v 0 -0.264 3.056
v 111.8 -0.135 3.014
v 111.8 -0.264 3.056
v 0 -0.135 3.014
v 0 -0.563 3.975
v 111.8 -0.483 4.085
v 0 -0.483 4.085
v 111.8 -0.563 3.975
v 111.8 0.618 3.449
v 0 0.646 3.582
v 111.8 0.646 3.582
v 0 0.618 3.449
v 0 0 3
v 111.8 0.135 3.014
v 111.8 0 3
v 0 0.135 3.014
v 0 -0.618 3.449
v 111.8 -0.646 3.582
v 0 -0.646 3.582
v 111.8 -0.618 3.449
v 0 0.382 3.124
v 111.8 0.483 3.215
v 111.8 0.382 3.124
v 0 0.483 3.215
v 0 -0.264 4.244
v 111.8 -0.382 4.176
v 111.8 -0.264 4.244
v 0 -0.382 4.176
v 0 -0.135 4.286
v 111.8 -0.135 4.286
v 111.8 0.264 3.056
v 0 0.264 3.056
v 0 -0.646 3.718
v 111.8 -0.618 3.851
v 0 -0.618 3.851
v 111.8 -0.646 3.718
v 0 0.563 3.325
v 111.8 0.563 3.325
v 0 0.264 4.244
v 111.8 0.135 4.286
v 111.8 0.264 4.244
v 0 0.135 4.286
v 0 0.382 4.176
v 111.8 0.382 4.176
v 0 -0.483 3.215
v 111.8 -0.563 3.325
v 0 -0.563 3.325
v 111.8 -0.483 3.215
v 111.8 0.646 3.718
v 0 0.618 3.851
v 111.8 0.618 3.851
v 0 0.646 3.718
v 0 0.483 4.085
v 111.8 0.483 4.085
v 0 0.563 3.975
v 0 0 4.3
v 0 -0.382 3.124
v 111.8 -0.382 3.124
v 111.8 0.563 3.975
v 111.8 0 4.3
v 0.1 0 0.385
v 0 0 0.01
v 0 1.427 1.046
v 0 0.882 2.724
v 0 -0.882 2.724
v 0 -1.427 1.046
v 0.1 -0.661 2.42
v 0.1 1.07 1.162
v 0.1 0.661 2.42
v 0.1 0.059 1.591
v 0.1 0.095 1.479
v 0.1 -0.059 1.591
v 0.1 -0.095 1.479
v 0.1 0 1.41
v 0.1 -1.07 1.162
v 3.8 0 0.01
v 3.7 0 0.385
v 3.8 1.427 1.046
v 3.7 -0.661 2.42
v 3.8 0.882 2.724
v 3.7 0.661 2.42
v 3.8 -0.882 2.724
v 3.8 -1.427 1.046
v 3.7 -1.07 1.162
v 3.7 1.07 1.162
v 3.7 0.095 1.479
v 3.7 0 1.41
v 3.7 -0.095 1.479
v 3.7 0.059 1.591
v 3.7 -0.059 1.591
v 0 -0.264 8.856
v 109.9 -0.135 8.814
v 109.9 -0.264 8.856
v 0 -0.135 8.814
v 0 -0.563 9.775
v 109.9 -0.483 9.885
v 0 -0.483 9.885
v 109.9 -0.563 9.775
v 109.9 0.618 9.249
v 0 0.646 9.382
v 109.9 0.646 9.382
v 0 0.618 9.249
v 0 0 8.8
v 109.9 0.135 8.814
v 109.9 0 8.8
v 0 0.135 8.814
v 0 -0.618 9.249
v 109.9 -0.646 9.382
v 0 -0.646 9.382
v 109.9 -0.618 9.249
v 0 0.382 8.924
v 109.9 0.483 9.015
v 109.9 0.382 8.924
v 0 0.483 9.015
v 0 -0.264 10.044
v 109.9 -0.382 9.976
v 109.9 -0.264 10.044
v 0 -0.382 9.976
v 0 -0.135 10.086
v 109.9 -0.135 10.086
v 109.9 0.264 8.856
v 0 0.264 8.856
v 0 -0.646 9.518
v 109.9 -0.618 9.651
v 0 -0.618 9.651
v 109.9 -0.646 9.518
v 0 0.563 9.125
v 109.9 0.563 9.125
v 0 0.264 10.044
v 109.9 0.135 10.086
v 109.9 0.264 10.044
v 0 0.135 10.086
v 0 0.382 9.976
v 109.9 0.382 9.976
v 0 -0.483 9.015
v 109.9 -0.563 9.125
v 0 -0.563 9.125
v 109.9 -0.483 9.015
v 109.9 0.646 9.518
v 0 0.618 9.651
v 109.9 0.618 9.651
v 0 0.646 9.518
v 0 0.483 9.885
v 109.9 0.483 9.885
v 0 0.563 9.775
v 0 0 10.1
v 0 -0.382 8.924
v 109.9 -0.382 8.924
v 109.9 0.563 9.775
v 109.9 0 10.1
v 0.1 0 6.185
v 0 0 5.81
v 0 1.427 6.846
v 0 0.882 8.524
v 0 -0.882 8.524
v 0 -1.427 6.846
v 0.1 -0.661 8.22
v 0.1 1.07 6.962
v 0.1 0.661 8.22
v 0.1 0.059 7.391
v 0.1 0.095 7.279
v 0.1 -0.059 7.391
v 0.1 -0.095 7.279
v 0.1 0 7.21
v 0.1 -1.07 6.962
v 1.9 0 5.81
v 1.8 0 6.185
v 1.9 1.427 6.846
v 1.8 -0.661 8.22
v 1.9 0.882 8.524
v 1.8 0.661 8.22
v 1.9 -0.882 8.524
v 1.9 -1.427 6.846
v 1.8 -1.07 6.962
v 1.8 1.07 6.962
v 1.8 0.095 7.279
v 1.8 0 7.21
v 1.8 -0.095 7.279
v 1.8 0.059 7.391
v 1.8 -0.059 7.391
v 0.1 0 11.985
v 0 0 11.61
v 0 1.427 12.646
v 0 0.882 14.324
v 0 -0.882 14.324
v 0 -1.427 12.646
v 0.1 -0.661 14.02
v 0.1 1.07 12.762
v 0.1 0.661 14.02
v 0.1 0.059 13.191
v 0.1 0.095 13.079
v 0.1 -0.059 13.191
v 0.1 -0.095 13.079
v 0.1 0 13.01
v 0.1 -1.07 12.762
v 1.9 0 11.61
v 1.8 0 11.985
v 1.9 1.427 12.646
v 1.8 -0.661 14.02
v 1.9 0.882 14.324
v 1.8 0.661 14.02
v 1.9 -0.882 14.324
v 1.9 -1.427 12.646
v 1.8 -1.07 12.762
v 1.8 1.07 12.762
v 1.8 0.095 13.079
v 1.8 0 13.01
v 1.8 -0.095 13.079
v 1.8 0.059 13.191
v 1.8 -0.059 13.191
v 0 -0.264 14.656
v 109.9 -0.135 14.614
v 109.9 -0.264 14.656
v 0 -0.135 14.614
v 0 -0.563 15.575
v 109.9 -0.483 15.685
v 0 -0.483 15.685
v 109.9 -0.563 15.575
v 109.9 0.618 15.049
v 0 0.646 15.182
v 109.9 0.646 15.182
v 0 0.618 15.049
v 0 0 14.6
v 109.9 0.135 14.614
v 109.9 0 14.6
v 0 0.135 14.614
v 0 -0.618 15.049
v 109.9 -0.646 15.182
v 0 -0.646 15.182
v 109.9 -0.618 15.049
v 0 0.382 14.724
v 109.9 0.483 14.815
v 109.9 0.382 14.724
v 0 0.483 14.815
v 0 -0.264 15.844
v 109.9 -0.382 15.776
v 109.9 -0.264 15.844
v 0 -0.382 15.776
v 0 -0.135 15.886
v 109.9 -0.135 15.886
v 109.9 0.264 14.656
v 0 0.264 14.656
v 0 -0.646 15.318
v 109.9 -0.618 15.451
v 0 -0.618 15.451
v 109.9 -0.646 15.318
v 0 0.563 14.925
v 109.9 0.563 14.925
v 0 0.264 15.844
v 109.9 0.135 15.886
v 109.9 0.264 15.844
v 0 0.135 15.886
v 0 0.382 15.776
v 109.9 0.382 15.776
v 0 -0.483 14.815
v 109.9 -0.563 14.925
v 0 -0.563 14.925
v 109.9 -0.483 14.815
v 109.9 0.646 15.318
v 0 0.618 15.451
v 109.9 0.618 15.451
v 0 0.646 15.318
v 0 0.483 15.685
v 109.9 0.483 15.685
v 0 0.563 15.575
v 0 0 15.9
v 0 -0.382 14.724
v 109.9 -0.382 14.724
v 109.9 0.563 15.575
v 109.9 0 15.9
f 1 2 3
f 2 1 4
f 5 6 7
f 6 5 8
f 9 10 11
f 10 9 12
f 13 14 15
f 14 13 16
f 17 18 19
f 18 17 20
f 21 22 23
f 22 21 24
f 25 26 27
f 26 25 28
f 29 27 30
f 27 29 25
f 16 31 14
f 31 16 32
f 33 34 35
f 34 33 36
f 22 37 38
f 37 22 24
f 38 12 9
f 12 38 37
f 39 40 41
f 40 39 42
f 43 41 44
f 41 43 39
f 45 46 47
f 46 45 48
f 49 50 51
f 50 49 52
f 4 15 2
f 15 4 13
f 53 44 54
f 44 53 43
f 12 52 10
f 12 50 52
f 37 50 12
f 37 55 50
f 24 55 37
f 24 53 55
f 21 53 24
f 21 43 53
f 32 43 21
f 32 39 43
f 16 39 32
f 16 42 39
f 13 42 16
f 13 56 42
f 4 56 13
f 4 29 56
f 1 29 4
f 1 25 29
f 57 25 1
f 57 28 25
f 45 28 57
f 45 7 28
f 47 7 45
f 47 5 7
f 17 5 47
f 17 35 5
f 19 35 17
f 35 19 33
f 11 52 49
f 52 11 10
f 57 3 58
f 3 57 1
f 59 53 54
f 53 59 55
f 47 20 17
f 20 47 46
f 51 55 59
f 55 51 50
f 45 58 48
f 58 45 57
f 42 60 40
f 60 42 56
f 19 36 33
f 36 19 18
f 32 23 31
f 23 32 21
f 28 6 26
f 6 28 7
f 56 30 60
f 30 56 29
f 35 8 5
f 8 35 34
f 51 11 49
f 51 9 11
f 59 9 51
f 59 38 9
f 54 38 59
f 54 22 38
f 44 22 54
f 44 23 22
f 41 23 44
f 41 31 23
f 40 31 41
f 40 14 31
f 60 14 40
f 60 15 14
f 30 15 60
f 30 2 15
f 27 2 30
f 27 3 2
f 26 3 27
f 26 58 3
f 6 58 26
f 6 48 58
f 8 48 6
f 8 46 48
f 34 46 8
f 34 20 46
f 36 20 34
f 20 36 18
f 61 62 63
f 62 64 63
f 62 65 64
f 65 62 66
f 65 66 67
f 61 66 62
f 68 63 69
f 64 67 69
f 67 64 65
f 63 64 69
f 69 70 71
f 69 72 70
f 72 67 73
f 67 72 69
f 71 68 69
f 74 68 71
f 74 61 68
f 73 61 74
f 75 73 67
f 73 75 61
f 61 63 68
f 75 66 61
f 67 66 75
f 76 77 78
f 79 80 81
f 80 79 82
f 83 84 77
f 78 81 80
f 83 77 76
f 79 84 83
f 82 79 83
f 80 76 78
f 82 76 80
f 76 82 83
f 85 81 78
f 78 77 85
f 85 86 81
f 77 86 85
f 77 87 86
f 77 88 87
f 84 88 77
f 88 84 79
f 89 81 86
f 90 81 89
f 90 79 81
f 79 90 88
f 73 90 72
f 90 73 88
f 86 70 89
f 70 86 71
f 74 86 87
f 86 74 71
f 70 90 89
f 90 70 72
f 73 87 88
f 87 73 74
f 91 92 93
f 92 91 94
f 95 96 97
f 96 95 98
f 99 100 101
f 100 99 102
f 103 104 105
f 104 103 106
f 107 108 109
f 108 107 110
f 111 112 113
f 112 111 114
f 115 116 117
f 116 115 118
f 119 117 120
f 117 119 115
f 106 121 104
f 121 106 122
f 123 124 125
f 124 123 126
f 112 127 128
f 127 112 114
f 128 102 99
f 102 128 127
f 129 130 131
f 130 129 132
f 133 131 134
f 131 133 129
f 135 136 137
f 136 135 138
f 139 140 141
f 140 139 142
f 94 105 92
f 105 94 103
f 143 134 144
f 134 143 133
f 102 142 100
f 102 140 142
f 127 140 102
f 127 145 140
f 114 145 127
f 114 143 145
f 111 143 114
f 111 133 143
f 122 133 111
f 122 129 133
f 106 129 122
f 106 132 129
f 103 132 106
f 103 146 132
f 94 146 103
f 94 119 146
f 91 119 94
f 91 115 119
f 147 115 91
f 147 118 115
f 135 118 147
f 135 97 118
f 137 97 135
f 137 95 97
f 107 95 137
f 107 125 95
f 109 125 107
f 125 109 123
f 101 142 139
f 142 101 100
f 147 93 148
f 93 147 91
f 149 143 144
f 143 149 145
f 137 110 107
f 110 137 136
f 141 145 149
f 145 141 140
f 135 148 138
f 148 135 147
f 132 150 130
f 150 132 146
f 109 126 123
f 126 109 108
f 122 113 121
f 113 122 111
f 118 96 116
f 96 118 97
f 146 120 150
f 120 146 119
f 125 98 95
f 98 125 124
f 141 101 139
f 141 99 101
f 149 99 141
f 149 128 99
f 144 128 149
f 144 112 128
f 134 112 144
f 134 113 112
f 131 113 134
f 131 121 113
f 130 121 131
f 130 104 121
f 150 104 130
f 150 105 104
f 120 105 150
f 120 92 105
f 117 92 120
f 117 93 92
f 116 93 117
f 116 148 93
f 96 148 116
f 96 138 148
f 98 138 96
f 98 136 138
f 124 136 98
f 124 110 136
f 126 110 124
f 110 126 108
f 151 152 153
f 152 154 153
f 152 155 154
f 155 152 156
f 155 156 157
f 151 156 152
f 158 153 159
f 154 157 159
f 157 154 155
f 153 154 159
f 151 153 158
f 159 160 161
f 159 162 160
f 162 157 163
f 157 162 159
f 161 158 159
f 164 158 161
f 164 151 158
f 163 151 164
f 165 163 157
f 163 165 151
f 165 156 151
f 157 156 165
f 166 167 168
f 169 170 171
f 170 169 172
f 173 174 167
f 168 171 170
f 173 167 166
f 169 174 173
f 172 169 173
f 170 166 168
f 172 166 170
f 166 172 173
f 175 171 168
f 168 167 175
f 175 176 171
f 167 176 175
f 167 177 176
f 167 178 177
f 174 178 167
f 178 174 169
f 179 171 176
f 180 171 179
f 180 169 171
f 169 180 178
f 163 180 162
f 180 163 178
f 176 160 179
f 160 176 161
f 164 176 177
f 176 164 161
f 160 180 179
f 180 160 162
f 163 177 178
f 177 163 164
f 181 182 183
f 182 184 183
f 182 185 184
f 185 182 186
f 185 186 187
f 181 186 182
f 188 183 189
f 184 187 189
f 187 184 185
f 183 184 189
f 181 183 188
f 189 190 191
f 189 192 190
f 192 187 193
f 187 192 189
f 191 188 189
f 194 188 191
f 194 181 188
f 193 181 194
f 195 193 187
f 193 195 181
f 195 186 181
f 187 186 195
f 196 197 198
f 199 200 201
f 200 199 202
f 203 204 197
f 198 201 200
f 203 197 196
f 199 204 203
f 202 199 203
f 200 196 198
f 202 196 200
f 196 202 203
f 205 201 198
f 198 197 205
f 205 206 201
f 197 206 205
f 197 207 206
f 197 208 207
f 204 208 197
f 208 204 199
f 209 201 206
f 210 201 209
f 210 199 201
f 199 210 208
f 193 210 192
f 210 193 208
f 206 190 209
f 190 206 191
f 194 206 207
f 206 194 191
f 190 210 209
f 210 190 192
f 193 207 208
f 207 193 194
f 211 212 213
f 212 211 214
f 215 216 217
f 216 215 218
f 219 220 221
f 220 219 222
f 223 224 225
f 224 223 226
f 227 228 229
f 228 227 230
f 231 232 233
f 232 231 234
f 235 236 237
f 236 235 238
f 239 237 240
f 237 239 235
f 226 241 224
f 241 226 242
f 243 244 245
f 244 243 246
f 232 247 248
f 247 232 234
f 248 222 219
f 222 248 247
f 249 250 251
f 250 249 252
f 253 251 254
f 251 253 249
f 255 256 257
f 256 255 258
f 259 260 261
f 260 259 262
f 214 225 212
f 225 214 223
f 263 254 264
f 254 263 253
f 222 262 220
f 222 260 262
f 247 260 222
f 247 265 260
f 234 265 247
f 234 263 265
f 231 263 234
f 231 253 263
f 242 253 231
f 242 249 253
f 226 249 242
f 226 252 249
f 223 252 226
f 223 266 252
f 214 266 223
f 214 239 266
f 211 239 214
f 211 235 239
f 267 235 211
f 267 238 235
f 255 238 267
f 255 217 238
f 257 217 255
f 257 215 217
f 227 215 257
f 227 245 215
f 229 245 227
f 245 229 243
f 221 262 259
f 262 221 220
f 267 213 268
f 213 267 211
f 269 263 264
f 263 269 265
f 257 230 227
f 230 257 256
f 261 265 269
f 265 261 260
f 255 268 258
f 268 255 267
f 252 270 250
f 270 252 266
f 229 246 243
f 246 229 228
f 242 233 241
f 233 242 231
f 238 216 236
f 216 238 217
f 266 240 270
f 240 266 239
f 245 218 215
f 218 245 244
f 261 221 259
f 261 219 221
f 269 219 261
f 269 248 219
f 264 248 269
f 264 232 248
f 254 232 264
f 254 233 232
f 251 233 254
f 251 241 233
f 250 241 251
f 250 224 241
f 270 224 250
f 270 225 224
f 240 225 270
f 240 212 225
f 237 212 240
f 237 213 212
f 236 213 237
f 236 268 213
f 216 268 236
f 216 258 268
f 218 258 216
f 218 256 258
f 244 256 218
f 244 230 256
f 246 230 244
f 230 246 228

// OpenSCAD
// file: ../common/common.scad
// minimum distance to move an edge to avoid face interference when slicing
err = 0.01;

// This is "cube" with two features:
//   1. length=x, thickness=y, width=z
//   2. errs vec for less noisy slicing
//
// Use errs to make pieces for slicing out of other pieces. The elements of the
// vector apply to [length, thickness, width]. Each value should be 0, 1, -1, or 2.
//   0: make the dimension exactly as specified
//   1: add `err` to the dimension
//  -1: add `err` to the dimension, but also shift the object -err
//      (i.e. add err to the zero end of that dimension)
//   2: add `2*err` to the dimension, but also shift the object -err
//      (i.e. add err to each end)
// Using errs prevents the need for +/-err to appear in object creation code.
module squareStock(length, thickness, width, errs=[0,0,0]) {
    translate([errs.x == 2 || errs.x == -1 ? -err : 0,
               errs.y == 2 || errs.y == -1 ? -err : 0,
               errs.z == 2 || errs.z == -1 ? -err : 0])
        cube([length + (err * abs(errs.x)),
              thickness + (err * abs(errs.y)),
              width + (err * abs(errs.z))]);
}

// This is "cylinder" with two features:
//   1. length=x (not height=z, as with cylinder)
//   2. errs vec for less noisy slicing
//
// See `squareStock` for description of errs. errs[0] applies to length.
// errs[1] applies to radius, but does not shift position for -1 or 2.
module roundStock(length, radius, errs=[0,0]) {
    translate([errs.x == 2 || errs.x == -1 ? -err : 0, 0, 0])
    rotate([0, 90, 0])
    cylinder(length + (err * abs(errs.x)),
             r = (radius + (err * abs(errs[1]))));
}
// main file
// View of unpainted dowel ends
//cmdline: --projection=o --imgsize=800,400

use <laundry-rack.scad>
use <../common/labeling.scad>

$vpr=[ 90.00, 0.00, 0.00 ];
$vpt=[ -7.08, -108.00, 9.74 ];
$vpf=22.50;
$vpd=70.41;

space = dowelDiameter() + sizeLabelHeight();

module paint() {
    color([0.8, 0.8, 0.8, 0.9]) rotate([0, 0, -90])
        dowel(longDowelLength(), errs=[0.01, 0]);
}

key([keyChildInfo("LONG DOWEL", 4, [0, 0, space]),
     keyChildInfo("LONG DOWEL", nonPivotLongDowelCount(),
                  [0, 0, space]),
     keyChildInfo("SHORT DOWEL", shortDowelCount(),
                  [0, 0, space])]) {
    translate([0,0,sizeLabelHeight()]) {
        translate([0, 0, dowelRadius()]) {
            rotate([0, 0, -90]) longDowel();
            translate([doubleSquareStockThickness(), 0]) paint();
        }
        sizeLabel(doubleSquareStockThickness());
    }
    translate([0,0,sizeLabelHeight()]) {
        translate([0, 0, dowelRadius()]) {
            rotate([0, 0, -90]) longDowel();
            translate([squareStockThickness(), 0]) paint();
        }
        sizeLabel(squareStockThickness());
    }
    translate([0,0,sizeLabelHeight()]) {
        translate([0, 0, dowelRadius()]) {
            rotate([0, 0, -90]) shortDowel();
            translate([squareStockThickness(), 0]) paint();
        }
        sizeLabel(squareStockThickness());
    }
}
